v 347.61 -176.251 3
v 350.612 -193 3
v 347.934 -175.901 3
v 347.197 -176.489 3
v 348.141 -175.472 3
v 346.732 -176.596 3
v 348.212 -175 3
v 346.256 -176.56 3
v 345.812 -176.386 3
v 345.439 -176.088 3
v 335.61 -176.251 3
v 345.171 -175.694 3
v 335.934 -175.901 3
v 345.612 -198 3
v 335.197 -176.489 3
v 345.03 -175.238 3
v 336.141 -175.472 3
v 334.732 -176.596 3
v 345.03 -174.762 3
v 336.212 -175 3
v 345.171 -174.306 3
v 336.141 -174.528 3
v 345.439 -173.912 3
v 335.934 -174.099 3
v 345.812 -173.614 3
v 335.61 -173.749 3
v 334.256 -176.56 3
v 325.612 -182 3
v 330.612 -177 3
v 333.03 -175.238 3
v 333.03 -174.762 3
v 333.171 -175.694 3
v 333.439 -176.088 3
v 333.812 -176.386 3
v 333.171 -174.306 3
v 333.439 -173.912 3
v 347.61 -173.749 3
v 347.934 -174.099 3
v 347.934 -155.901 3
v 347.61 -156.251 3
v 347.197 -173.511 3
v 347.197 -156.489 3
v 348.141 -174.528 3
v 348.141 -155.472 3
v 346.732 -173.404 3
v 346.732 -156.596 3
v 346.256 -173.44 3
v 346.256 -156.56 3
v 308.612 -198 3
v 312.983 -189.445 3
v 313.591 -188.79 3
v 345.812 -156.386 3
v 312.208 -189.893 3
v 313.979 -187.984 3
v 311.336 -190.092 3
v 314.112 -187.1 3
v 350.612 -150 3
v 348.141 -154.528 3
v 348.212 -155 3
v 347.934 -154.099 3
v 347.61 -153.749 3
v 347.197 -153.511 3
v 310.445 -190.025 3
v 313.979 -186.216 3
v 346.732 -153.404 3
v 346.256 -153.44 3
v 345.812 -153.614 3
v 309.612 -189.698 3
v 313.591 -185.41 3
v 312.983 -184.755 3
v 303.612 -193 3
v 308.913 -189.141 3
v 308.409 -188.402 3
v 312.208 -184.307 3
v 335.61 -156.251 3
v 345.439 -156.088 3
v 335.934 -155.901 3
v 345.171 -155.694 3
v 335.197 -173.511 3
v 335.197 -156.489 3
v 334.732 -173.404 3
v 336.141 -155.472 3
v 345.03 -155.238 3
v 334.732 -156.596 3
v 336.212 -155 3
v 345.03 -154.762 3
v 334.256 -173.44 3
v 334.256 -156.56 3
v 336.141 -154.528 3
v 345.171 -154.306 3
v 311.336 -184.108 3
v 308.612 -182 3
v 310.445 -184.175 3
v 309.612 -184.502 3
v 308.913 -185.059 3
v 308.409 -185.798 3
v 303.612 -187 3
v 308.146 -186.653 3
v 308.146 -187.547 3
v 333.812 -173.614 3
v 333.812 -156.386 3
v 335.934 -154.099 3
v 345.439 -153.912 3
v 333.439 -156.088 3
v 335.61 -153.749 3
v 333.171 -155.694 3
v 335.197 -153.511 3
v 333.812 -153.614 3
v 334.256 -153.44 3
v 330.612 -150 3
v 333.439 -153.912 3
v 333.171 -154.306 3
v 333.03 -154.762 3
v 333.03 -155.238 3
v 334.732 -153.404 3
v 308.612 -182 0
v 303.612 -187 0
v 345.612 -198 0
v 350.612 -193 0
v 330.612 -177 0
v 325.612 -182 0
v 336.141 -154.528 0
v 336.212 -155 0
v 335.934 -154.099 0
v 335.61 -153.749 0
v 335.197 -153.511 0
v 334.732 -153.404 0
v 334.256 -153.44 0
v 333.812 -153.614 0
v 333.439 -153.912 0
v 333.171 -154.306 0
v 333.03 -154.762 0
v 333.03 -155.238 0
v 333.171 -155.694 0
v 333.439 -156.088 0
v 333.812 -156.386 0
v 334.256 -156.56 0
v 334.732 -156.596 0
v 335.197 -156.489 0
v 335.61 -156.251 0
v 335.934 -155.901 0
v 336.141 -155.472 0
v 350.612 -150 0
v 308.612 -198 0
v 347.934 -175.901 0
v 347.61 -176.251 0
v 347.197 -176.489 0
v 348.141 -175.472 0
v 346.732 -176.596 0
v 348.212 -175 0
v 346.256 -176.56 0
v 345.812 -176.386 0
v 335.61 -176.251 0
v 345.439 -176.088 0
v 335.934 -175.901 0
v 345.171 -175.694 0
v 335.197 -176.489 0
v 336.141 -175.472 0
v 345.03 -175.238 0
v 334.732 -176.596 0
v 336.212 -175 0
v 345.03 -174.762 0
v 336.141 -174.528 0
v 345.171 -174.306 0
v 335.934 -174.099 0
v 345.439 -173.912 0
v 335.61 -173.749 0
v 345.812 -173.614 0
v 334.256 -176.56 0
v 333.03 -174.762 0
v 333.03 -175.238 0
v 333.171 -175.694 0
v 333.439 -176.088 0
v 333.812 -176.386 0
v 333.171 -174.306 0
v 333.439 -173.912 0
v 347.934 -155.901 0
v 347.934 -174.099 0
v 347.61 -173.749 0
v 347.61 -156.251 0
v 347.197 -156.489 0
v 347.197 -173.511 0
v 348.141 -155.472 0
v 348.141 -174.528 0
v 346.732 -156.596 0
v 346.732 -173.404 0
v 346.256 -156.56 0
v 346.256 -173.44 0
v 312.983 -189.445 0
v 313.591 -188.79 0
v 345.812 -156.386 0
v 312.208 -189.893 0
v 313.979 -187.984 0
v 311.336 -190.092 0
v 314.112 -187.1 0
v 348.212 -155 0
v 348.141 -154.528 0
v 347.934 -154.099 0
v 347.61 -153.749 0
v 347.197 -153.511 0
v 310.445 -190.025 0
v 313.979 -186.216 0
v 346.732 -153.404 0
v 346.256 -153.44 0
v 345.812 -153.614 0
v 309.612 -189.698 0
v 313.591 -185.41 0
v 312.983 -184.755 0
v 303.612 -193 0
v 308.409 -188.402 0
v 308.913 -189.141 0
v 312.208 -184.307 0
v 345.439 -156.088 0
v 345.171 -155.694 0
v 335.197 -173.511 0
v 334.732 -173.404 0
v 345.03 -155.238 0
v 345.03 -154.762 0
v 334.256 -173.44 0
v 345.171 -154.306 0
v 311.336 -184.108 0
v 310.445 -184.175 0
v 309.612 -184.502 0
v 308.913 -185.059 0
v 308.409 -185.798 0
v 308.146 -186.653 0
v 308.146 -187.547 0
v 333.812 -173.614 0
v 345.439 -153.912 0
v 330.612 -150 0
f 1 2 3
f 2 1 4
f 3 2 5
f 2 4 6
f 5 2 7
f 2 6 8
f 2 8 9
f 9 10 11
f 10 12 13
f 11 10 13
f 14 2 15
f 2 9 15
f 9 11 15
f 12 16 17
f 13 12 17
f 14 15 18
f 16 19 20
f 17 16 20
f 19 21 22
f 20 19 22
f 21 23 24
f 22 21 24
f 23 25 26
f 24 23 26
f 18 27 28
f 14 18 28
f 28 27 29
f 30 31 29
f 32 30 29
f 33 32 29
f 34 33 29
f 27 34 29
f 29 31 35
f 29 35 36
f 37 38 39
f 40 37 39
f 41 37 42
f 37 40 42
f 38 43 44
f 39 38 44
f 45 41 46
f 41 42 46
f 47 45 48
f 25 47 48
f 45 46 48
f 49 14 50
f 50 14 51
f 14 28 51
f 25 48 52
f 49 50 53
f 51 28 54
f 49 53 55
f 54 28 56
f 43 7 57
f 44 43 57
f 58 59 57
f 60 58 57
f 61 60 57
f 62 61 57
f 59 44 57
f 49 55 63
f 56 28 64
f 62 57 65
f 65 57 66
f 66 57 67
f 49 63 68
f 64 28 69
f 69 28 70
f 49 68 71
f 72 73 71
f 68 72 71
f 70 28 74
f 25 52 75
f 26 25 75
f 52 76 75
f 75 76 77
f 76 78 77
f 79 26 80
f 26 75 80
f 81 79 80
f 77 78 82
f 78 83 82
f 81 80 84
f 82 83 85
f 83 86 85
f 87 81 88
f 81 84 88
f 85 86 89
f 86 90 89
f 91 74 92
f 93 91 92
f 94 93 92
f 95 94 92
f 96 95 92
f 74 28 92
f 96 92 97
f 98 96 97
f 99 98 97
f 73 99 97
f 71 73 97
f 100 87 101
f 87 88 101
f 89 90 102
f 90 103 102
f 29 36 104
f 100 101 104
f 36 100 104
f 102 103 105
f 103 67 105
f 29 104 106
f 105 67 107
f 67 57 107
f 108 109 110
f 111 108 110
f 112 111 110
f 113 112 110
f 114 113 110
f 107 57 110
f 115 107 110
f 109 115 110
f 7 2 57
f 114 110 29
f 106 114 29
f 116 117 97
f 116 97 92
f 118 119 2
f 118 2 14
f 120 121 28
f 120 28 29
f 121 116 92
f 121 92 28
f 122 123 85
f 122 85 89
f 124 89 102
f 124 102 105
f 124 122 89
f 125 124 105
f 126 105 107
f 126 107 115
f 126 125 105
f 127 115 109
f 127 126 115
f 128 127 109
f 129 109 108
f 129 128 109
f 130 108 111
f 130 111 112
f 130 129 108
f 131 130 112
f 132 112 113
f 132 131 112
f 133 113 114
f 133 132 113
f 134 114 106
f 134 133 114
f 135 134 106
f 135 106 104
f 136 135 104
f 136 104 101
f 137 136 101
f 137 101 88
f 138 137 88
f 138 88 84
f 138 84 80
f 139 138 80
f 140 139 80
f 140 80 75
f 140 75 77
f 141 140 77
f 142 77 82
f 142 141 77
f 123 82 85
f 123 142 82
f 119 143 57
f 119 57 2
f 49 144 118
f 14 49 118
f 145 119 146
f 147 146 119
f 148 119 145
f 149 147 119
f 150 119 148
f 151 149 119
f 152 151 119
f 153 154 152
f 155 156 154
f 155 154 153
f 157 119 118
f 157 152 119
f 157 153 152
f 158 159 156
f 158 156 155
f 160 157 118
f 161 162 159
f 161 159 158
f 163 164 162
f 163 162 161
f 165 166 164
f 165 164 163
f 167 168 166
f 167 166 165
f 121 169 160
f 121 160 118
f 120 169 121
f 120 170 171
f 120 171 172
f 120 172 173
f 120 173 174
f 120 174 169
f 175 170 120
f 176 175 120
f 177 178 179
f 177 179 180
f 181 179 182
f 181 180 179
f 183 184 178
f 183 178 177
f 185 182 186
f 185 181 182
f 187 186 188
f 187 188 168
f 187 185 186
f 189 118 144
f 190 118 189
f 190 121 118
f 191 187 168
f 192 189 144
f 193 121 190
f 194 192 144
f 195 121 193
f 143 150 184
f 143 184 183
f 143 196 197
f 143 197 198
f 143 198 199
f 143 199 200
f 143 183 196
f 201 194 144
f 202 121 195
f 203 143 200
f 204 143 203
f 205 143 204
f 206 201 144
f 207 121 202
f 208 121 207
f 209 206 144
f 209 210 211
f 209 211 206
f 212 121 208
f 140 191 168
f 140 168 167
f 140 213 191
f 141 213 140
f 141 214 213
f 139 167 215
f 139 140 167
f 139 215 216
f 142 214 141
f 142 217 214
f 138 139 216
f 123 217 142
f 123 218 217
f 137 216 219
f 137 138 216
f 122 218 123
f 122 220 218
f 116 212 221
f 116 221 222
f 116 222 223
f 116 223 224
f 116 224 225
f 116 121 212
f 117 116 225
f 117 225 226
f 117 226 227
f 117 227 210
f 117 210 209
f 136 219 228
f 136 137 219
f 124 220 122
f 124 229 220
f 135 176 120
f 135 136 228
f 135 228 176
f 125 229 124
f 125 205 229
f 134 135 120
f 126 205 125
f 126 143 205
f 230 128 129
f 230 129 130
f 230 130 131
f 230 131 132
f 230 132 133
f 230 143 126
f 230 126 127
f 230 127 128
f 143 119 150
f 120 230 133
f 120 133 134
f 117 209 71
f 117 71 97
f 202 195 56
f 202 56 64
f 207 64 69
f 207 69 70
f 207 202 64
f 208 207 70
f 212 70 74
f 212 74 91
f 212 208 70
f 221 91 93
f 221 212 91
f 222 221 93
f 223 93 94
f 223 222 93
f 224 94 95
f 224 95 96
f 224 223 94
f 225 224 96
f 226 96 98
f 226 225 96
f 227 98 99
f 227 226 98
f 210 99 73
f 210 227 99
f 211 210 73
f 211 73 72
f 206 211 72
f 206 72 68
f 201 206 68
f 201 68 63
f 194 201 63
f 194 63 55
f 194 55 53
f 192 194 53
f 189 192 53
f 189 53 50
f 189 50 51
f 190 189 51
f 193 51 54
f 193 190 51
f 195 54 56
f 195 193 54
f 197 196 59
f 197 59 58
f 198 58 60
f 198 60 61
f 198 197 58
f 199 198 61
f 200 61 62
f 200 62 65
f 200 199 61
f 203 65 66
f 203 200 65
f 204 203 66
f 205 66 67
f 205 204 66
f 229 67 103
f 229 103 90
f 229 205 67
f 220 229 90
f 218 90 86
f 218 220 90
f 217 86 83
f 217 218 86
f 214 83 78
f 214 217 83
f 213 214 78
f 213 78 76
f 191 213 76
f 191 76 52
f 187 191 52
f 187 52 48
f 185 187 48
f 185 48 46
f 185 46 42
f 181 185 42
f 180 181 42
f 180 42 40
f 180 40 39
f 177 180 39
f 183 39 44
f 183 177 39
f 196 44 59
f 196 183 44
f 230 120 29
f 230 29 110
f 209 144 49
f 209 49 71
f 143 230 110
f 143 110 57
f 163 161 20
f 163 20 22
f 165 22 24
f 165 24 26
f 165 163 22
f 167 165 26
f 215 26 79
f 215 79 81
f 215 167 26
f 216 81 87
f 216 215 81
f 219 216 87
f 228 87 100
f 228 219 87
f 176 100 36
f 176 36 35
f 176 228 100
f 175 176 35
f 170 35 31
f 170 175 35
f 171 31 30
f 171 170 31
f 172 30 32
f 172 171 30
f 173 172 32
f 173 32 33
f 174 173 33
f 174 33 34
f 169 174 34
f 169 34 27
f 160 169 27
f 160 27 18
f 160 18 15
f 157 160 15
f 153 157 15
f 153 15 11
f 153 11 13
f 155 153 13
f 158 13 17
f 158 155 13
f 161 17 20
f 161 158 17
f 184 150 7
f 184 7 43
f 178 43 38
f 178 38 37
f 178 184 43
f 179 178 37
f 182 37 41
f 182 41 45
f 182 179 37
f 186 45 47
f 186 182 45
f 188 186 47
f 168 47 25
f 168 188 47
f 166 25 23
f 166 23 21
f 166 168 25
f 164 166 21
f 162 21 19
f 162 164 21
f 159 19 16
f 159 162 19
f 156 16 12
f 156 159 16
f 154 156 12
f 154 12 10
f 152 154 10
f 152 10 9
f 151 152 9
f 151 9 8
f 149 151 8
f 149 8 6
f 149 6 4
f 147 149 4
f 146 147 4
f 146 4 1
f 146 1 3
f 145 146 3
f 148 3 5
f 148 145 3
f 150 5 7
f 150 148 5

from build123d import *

# Parameters (mm, degrees)
SKETCH1_R           = 3
SKETCH1_R_2         = 1.6
BOSS_EXTRUDE1_DEPTH = 3


with BuildPart() as part:
    # Sketch1 → Boss-Extrude1 (new body)
    with BuildSketch(Plane.XY):
        Polygon((330.61212976, -150), (350.61212976, -150), (350.61212976, -193), (345.61212976, -198), (330.61212976, -198), (308.61212976, -198), (303.61212976, -193), (303.61212976, -187), (308.61212976, -182), (325.61212976, -182), (330.61212976, -177), align=None)
        with Locations((311.11212976, -187.1)):
            Circle(SKETCH1_R, mode=Mode.SUBTRACT)
        with Locations((334.61212976, -155)):
            Circle(SKETCH1_R_2, mode=Mode.SUBTRACT)
        with Locations((346.61212976, -155)):
            Circle(SKETCH1_R_2, mode=Mode.SUBTRACT)
        with Locations((334.61212976, -175)):
            Circle(SKETCH1_R_2, mode=Mode.SUBTRACT)
        with Locations((346.61212976, -175)):
            Circle(SKETCH1_R_2, mode=Mode.SUBTRACT)
    extrude(amount=BOSS_EXTRUDE1_DEPTH)


solid = part.part
